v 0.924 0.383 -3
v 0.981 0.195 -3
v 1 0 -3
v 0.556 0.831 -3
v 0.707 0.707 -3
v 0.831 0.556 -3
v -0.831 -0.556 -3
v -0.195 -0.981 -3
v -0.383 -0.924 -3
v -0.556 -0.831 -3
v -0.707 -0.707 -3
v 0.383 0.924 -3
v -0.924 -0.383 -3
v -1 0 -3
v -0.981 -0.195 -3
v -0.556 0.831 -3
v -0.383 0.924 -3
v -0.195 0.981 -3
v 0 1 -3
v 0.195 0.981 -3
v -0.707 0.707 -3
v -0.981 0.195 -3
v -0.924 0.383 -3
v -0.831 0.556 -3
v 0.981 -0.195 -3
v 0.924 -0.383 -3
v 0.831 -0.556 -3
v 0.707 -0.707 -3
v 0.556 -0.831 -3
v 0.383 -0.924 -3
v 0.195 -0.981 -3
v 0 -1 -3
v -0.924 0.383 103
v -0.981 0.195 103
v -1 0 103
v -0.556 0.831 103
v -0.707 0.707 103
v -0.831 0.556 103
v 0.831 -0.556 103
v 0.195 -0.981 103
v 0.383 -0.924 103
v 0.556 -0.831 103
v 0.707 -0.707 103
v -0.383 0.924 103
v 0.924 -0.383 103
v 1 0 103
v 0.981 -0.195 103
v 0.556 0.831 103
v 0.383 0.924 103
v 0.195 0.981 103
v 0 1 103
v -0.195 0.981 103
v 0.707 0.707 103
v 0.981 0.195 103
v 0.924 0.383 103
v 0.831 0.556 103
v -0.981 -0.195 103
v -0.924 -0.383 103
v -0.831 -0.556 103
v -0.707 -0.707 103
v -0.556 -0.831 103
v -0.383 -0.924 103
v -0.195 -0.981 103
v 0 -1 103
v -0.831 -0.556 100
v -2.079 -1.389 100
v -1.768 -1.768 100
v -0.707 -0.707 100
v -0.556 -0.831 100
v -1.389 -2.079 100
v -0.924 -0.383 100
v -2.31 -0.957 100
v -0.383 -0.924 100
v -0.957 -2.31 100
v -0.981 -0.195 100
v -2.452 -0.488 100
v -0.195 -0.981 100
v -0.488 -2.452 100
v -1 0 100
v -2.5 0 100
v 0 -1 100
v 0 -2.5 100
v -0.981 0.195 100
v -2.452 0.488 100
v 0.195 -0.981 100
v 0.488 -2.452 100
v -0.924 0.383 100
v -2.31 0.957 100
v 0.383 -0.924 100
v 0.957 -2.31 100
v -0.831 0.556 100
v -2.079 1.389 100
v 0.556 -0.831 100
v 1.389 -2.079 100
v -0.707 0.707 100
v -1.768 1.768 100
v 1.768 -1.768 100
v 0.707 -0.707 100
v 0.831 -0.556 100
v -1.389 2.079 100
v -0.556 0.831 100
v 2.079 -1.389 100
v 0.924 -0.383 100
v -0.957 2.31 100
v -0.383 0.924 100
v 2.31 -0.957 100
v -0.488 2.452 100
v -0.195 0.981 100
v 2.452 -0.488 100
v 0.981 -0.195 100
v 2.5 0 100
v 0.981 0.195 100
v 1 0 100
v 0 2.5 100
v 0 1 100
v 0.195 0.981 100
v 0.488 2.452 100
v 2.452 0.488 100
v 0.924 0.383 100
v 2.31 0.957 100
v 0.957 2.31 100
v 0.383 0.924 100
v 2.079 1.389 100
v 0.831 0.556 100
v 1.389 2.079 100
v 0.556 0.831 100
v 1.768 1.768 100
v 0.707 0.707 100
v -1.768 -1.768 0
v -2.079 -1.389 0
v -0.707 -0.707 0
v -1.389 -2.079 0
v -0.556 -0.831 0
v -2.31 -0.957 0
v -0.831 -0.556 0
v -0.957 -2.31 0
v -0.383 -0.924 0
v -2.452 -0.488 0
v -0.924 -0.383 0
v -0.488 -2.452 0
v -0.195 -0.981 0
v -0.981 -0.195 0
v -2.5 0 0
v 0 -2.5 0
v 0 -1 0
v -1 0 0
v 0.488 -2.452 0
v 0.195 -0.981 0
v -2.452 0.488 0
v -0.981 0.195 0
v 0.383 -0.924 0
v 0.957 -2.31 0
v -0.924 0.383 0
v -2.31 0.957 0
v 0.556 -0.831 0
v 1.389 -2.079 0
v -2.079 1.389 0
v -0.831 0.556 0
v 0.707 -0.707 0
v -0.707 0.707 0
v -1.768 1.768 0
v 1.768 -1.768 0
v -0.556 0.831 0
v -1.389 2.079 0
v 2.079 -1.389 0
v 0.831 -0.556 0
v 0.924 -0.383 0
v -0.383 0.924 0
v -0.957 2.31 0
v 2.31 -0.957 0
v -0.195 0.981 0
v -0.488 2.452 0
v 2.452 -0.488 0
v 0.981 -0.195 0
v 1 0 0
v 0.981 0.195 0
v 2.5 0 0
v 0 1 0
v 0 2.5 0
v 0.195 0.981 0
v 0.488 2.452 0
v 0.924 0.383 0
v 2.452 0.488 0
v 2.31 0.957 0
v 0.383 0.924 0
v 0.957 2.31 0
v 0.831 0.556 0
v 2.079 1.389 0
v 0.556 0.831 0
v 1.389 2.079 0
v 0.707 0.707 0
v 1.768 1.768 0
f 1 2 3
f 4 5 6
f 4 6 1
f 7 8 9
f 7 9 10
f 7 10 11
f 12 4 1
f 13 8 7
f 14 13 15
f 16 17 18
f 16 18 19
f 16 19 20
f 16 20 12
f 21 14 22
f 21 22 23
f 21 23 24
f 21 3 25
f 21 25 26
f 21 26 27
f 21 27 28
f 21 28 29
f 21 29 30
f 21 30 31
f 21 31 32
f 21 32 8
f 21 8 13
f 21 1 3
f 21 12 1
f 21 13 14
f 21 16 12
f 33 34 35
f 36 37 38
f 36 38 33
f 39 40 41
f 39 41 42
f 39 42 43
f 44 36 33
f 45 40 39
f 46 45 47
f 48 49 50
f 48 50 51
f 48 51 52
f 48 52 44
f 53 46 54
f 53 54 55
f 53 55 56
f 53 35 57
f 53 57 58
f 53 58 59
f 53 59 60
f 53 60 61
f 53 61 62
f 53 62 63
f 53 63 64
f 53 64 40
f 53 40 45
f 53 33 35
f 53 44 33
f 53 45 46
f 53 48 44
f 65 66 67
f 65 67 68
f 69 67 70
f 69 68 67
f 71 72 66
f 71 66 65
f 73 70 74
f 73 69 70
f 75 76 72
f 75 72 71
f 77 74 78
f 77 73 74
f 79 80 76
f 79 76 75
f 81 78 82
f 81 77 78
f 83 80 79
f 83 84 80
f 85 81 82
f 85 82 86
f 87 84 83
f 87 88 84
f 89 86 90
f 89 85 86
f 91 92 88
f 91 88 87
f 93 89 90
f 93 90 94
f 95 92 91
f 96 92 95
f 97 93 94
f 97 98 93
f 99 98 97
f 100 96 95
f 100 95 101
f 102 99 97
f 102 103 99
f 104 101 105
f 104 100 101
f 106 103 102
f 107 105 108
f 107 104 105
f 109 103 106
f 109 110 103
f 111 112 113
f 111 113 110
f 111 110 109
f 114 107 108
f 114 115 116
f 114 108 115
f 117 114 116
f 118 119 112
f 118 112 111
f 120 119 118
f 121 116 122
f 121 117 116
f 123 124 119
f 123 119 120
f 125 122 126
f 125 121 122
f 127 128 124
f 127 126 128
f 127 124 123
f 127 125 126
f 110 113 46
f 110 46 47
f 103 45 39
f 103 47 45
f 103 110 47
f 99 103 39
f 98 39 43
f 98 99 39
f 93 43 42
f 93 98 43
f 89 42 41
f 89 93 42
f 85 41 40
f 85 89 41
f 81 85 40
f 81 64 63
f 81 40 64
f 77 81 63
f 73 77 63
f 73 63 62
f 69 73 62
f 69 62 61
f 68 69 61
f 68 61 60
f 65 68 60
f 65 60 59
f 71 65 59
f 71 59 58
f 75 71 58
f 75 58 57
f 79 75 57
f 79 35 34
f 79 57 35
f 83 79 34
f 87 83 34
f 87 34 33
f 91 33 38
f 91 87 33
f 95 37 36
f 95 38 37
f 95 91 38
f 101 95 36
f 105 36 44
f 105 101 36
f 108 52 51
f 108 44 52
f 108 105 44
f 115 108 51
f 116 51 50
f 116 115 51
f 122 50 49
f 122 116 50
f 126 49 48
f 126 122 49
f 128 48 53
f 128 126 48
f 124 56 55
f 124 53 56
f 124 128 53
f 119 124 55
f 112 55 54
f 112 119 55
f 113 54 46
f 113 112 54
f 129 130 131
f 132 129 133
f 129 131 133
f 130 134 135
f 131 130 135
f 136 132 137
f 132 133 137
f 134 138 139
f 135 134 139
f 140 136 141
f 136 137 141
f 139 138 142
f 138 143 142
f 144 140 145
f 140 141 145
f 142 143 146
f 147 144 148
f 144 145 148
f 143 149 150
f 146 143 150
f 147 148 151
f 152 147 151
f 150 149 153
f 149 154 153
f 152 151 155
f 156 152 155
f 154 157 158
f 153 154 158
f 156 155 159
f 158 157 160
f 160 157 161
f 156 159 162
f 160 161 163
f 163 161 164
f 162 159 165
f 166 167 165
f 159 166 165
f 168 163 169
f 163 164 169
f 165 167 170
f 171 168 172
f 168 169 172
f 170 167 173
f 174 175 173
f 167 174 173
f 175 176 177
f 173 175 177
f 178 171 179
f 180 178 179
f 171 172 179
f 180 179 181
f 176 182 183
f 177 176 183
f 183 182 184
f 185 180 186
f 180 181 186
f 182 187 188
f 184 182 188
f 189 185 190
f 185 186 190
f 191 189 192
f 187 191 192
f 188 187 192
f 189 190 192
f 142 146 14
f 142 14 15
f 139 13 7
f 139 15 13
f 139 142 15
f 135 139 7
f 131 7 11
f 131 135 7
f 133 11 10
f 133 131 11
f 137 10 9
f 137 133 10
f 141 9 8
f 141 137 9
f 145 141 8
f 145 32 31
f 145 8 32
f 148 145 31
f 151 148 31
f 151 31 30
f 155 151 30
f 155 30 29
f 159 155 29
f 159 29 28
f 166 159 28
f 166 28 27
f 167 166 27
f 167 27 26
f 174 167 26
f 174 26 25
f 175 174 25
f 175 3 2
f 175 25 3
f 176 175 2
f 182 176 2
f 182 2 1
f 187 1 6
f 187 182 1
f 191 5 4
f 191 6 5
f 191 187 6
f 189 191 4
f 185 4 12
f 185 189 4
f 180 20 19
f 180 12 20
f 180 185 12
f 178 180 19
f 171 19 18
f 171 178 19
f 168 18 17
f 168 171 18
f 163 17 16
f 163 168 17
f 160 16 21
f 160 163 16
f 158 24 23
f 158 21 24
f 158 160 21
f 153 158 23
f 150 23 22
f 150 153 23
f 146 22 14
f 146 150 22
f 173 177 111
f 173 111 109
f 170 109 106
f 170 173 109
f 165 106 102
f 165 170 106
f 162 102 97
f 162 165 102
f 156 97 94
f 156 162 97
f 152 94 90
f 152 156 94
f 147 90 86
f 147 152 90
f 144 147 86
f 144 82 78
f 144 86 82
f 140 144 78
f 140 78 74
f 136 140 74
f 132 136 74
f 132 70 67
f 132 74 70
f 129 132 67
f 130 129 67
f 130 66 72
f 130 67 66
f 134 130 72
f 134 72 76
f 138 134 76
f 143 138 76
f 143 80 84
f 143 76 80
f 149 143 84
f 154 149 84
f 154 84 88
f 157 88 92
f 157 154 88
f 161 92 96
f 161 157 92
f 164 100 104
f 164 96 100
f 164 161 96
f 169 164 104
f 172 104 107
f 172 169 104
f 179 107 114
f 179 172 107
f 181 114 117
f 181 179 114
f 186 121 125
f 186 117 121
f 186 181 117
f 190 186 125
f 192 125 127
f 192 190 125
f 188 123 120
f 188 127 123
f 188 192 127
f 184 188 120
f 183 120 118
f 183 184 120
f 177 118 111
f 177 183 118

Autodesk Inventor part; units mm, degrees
ref_plane "YZ Plane" through (0, 0, 0) normal (1, 0, 0) x (0, 1, 0)
ref_plane "XZ Plane" through (0, 0, 0) normal (0, 1, 0) x (-1, 0, 0)
ref_plane "XY Plane" through (0, 0, 0) normal (0, 0, 1) x (1, 0, 0)
sketch "Sketch1" plane through (0, 0, 0) normal (0, 0, 1) x (1, 0, 0)
  circle A0 centre (0, 0) radius 2.5
  dimension "d0" = 5
extrude "Extrusion1" add sketch "Sketch1" along normal blind 100
sketch "Sketch2" plane through (0, 0, 100) normal (0, 0, 1) x (1, 0, 0)
  circle A0 centre (0, 0) radius 2.5 projected
  circle A1 centre (0, 0) radius 1
  dimension "d3" = 2
extrude "Extrusion2" add sketch "Sketch2" along normal blind 3 contours A1
sketch "Sketch3" plane through (0, 0, 0) normal (0, 0, -1) x (-1, 0, 0)
  circle A0 centre (0, 0) radius 1
  dimension "d6" = 2
extrude "Extrusion3" add sketch "Sketch3" along normal blind 3
properties part number "Bone-10cm"
